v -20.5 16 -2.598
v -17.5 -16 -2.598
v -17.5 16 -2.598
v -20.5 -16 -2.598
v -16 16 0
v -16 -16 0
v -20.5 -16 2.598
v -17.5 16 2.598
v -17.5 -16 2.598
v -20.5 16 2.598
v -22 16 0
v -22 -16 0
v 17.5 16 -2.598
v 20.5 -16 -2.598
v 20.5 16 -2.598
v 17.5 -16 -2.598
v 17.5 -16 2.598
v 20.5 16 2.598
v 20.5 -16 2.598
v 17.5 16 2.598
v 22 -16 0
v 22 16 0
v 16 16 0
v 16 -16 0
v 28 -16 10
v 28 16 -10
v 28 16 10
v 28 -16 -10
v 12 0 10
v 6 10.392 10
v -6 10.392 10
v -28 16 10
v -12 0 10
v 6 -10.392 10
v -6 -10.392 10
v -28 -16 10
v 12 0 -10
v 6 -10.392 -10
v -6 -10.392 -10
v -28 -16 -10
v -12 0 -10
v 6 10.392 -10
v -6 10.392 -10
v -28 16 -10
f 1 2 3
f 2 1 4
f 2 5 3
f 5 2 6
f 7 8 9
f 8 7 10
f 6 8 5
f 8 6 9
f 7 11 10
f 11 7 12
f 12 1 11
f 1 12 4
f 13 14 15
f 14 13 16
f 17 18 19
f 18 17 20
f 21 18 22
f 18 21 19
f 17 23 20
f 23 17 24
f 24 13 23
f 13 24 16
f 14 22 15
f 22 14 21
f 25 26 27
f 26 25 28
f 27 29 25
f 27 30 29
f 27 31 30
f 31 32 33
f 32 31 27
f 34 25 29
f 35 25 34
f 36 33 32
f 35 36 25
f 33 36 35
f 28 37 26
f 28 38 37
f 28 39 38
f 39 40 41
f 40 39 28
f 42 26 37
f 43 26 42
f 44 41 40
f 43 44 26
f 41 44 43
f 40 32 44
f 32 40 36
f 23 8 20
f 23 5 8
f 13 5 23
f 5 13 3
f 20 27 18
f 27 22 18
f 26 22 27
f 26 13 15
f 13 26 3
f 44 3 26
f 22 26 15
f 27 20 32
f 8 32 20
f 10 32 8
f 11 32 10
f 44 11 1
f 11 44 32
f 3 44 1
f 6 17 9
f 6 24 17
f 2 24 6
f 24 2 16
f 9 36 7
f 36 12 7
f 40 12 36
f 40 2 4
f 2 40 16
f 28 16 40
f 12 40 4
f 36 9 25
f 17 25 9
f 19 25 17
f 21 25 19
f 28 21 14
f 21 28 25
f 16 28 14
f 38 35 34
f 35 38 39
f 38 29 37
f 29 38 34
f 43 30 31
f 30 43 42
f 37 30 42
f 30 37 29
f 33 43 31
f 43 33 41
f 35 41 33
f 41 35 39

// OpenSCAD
$fn=6;

difference(){
    cube([56,32,20],center=true); 
    cylinder(r=12,h=20,center=true); 
    for(i=[-1,1]) rotate([90,0,0]) translate([19*i,0,-20]) cylinder(d=6, h=200); 
}
